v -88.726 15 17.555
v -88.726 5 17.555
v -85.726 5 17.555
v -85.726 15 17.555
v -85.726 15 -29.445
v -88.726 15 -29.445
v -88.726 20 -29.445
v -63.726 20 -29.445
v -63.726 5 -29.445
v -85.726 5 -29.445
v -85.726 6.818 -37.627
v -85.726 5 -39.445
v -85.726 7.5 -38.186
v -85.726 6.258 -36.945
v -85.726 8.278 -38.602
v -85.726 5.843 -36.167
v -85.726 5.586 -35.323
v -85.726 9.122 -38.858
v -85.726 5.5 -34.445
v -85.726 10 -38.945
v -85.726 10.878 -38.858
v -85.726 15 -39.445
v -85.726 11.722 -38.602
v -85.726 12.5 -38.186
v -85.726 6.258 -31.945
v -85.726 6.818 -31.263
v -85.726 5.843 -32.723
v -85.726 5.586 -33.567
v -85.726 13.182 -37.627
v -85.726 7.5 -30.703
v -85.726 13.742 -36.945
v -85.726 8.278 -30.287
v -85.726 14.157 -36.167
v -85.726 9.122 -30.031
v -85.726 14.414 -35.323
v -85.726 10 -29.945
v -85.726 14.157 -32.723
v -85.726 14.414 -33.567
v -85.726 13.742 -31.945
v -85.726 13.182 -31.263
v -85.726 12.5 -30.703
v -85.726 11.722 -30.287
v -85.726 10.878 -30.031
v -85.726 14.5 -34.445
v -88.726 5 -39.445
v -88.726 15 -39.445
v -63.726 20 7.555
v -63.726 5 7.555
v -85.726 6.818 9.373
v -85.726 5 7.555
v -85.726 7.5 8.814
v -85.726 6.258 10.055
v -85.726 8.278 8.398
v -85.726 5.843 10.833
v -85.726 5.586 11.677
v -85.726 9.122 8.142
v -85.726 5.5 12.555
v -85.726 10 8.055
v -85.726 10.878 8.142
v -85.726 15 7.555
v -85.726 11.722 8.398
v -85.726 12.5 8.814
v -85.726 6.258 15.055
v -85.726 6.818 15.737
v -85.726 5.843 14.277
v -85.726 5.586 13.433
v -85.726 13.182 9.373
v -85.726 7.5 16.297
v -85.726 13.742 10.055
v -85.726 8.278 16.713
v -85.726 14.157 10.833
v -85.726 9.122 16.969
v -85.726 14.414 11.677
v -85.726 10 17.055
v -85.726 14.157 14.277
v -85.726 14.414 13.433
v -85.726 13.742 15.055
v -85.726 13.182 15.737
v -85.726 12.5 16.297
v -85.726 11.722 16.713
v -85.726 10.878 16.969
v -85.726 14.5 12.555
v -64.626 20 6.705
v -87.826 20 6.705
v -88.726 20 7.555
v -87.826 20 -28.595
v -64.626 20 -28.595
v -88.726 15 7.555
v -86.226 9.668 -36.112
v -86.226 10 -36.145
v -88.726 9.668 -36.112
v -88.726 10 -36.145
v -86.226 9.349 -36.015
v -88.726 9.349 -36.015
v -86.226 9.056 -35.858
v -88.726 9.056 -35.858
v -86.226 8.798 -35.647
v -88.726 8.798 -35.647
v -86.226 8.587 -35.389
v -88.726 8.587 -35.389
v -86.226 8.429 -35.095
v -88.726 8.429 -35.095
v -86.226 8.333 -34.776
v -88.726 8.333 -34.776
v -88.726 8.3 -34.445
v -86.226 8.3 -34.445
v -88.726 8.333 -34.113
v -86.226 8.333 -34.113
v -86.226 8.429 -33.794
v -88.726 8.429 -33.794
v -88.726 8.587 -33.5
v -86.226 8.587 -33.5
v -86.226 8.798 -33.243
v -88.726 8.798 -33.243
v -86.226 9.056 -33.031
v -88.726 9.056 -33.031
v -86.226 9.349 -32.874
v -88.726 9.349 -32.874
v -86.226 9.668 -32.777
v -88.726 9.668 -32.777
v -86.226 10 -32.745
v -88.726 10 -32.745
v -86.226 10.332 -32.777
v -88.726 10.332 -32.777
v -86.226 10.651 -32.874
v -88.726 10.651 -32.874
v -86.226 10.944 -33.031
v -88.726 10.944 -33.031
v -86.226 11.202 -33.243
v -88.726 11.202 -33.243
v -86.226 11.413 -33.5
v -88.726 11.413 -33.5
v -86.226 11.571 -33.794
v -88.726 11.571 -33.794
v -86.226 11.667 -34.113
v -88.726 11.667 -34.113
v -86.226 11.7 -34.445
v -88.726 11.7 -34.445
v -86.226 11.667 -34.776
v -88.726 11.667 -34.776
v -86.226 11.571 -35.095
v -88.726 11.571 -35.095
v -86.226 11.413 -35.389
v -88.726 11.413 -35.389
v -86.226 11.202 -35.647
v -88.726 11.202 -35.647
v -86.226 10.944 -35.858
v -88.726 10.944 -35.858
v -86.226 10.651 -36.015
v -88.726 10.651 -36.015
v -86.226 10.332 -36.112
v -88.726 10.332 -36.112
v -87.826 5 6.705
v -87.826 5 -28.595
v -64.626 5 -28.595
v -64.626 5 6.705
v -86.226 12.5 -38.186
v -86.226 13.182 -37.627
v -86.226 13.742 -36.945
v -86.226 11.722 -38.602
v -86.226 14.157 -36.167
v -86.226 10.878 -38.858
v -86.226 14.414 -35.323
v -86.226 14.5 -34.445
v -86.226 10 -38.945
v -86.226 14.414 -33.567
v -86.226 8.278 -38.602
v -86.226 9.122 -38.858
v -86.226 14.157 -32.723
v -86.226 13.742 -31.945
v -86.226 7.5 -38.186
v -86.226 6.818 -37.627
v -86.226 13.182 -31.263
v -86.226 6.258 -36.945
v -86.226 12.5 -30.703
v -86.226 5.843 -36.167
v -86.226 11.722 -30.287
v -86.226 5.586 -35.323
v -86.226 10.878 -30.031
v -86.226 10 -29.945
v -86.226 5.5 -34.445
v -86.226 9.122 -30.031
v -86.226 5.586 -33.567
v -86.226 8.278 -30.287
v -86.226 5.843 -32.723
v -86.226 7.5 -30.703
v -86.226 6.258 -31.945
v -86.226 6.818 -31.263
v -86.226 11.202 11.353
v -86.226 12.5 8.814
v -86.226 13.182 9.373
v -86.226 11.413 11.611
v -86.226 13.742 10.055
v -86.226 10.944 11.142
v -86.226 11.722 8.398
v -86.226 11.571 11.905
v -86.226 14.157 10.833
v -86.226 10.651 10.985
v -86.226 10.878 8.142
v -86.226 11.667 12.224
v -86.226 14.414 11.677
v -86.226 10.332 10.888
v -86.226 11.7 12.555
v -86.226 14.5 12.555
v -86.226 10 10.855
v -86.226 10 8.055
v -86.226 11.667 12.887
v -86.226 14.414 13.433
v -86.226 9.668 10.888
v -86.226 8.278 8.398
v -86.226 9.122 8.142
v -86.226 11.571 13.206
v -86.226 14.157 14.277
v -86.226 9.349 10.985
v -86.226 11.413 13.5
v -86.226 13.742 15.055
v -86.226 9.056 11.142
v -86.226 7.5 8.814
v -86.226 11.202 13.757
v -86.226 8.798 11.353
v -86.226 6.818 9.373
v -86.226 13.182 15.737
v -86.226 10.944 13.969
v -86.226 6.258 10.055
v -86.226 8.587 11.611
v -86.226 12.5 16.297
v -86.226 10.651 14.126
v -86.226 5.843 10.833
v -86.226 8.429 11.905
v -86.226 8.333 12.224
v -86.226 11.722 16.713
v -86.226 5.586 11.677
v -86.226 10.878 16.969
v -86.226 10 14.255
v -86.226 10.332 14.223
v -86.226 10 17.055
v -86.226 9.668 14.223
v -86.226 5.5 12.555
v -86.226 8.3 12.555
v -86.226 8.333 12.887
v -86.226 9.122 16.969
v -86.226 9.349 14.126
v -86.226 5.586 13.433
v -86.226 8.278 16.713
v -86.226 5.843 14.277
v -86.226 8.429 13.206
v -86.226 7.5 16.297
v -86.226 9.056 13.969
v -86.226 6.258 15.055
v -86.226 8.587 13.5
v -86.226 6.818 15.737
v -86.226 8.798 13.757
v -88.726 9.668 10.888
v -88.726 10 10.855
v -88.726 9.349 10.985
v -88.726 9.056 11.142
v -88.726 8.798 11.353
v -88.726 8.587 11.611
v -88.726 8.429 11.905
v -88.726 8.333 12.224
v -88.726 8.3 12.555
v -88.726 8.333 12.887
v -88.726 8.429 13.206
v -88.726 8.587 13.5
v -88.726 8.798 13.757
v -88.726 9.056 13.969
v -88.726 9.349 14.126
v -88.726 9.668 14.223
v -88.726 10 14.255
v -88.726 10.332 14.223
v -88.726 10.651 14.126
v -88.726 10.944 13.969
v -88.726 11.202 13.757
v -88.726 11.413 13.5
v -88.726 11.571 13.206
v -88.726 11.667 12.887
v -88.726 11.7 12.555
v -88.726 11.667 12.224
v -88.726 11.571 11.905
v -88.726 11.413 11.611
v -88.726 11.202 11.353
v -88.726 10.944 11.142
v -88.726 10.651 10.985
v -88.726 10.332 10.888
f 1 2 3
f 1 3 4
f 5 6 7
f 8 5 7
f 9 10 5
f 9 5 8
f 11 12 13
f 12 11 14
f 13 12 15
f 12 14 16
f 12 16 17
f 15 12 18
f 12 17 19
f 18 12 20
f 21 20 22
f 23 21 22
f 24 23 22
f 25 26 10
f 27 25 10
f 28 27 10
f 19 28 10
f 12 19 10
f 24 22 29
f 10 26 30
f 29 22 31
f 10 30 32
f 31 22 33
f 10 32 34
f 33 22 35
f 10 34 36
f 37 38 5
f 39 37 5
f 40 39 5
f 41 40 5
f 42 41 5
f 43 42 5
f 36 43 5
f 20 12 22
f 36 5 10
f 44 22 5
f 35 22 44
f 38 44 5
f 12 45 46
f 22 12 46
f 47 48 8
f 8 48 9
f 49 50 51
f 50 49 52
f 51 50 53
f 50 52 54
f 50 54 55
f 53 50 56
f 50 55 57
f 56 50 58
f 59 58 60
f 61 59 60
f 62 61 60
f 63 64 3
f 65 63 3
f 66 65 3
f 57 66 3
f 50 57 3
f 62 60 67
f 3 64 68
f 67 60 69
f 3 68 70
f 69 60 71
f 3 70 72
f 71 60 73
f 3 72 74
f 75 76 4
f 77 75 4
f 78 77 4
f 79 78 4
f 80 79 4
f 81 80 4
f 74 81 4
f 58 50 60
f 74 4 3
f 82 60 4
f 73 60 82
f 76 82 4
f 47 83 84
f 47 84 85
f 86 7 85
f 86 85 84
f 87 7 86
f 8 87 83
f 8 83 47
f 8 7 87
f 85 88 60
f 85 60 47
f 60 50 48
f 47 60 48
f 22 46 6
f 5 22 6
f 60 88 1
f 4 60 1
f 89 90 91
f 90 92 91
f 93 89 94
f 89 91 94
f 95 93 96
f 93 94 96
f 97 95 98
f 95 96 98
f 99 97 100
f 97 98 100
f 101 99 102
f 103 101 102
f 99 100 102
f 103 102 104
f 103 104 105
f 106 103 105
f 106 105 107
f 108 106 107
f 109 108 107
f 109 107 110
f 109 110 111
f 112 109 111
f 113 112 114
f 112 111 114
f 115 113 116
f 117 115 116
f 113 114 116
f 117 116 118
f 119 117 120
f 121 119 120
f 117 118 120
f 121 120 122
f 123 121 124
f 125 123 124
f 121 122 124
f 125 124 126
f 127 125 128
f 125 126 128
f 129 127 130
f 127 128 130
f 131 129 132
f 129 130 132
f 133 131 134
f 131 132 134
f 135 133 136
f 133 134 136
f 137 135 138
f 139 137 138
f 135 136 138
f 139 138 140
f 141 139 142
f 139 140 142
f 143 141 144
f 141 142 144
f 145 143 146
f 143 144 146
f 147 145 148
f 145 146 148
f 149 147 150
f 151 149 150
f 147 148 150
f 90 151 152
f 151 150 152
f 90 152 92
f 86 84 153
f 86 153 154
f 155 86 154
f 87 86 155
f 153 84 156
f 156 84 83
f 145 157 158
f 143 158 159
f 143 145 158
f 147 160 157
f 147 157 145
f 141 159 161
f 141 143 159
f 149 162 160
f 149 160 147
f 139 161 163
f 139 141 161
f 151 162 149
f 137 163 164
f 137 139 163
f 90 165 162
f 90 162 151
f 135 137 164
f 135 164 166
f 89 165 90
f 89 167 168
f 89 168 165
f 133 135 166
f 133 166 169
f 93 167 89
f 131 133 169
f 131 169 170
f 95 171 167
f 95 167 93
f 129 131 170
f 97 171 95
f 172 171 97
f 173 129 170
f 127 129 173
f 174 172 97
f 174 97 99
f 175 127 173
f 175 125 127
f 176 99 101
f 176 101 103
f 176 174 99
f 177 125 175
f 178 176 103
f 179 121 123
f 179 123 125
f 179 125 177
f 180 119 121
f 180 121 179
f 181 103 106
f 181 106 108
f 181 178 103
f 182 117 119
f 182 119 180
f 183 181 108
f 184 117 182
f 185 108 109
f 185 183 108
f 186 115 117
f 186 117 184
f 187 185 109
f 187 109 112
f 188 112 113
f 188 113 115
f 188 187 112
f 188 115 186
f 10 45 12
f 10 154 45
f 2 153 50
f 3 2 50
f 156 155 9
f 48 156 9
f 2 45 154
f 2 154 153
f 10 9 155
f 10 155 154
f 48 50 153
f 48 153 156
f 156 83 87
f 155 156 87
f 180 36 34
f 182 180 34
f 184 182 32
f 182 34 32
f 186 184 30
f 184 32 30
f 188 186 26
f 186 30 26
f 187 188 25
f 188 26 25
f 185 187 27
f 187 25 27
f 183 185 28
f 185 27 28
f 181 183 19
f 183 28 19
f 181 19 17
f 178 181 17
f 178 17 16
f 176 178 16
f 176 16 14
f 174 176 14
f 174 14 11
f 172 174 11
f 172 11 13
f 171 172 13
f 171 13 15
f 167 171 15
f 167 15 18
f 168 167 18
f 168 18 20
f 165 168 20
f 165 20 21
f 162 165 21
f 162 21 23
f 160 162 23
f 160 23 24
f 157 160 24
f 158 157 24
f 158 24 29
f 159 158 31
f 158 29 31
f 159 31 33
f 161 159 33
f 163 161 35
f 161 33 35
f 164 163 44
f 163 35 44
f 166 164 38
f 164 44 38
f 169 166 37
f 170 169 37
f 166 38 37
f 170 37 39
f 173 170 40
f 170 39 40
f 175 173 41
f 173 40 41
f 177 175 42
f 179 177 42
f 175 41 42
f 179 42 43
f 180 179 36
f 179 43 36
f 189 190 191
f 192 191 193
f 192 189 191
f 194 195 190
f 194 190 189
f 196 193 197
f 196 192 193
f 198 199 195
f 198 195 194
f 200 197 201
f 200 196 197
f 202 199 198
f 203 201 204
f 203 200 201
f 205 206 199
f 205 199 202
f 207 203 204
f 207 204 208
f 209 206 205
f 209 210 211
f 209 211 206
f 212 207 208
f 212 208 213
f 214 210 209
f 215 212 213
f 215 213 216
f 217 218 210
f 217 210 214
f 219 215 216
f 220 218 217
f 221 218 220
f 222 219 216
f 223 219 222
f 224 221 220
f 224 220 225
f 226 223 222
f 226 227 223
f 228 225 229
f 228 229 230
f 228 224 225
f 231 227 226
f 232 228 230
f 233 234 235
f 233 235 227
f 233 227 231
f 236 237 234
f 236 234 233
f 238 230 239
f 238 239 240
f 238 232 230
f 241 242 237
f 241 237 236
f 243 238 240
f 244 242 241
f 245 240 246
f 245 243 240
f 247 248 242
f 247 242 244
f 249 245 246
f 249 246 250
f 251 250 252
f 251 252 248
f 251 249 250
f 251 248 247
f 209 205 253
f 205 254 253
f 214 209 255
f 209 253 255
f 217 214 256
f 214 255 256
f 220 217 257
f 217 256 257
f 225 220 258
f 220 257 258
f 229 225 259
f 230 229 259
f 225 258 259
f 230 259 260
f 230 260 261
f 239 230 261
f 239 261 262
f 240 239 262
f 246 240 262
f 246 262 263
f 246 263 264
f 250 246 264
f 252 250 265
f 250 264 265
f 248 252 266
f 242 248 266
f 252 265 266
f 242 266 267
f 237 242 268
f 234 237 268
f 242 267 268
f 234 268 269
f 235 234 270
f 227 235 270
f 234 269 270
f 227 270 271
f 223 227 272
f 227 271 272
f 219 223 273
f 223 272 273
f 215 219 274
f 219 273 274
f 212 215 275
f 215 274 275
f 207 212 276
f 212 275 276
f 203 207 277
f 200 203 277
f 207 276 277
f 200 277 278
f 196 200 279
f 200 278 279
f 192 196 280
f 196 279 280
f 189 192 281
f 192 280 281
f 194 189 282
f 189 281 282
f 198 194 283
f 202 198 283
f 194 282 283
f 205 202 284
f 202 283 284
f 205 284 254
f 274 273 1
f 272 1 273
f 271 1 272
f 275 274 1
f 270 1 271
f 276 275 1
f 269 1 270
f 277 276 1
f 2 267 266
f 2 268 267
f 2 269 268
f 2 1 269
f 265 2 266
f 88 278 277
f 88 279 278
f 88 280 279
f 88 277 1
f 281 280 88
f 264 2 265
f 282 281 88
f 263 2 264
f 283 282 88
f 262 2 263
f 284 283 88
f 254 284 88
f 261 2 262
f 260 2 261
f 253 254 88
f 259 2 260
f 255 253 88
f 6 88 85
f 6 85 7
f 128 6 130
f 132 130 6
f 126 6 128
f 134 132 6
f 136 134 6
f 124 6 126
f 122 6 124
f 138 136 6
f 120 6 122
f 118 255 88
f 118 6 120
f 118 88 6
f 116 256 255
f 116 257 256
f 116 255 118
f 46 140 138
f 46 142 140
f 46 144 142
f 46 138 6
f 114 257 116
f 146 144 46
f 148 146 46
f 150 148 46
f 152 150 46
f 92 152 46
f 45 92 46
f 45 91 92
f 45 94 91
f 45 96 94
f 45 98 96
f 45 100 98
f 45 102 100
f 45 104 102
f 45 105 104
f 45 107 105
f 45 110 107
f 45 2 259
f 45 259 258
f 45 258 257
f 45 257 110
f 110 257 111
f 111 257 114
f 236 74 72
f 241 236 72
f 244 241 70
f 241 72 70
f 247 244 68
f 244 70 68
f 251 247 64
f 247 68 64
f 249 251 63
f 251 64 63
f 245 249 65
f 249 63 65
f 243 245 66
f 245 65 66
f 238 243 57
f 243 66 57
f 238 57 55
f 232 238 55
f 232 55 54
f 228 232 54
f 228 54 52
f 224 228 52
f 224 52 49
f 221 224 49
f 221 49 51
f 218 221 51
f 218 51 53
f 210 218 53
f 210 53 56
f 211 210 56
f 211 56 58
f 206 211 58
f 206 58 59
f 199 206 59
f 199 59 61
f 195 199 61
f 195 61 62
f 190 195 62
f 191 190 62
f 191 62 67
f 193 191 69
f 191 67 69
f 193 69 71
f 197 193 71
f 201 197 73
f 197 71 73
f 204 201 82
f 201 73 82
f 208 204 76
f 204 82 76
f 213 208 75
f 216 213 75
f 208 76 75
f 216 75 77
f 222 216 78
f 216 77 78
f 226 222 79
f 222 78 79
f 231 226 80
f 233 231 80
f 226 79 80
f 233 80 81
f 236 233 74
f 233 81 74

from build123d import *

# Parameters (mm, degrees)
SKETCH1_W                                            = 25
SKETCH1_H                                            = 37
BOSS_EXTRUDE2_DEPTH                                  = 20
SKETCH4_W                                            = 23.2
SKETCH4_H                                            = 35.3
CUT_EXTRUDE1_DEPTH                                   = 18
SKETCH30_W                                           = 10
SKETCH30_H                                           = 10
BOSS_EXTRUDE5_DEPTH                                  = 3
CBORE_FOR_M3_HEXAGON_HEAD_BOLTS_FULL_THR_D           = 3.4
CBORE_FOR_M3_HEXAGON_HEAD_BOLTS_FULL_THR_CBORE_D     = 9
CBORE_FOR_M3_HEXAGON_HEAD_BOLTS_FULL_THR_CBORE_DEPTH = 0.5
SKETCH32_W                                           = 25
SKETCH32_H                                           = 37
CUT_EXTRUDE2_DEPTH                                   = 5


with BuildPart() as part:
    # Sketch1 → Boss-Extrude2 (new body)
    with BuildSketch(Plane(origin=(0, 0, 0), x_dir=(1, 0, 0), z_dir=(0, 1, 0))):
        with Locations((-76.226170177, 10.94482429)):
            Rectangle(SKETCH1_W, SKETCH1_H)
    extrude(amount=BOSS_EXTRUDE2_DEPTH)

    # Sketch4 → Cut-Extrude1 (cut)
    with BuildSketch(Plane(origin=(0, 20, 0), x_dir=(1, 0, 0), z_dir=(0, 1, 0))):
        with Locations((-76.226170177, 10.94482429)):
            Rectangle(SKETCH4_W, SKETCH4_H)
    extrude(amount=-CUT_EXTRUDE1_DEPTH, mode=Mode.SUBTRACT)

    # Sketch30 → Boss-Extrude5 (add)
    with BuildSketch(Plane.ZY.offset(88.726170177)):
        with Locations((-34.44482429, 10)):
            Rectangle(SKETCH30_W, SKETCH30_H)
        with Locations((12.55517571, 10)):
            Rectangle(SKETCH30_W, SKETCH30_H)
    extrude(amount=-BOSS_EXTRUDE5_DEPTH)

    # CBORE for M3 Hexagon head bolts-Full thread-grades AB5 (through all)
    with Locations(Plane(origin=(-85.726170177, 10, -34.44482429), x_dir=(0, 0, 1), z_dir=(1, 0, 0))):
        with Locations((0, 0), (47, 0)):
            CounterBoreHole(CBORE_FOR_M3_HEXAGON_HEAD_BOLTS_FULL_THR_D / 2, CBORE_FOR_M3_HEXAGON_HEAD_BOLTS_FULL_THR_CBORE_D / 2, CBORE_FOR_M3_HEXAGON_HEAD_BOLTS_FULL_THR_CBORE_DEPTH)

    # Sketch32 → Cut-Extrude2 (cut)
    with BuildSketch(Plane.XZ):
        with Locations((-76.226170177, -10.94482429)):
            Rectangle(SKETCH32_W, SKETCH32_H)
    extrude(amount=-CUT_EXTRUDE2_DEPTH, mode=Mode.SUBTRACT)


solid = part.part
